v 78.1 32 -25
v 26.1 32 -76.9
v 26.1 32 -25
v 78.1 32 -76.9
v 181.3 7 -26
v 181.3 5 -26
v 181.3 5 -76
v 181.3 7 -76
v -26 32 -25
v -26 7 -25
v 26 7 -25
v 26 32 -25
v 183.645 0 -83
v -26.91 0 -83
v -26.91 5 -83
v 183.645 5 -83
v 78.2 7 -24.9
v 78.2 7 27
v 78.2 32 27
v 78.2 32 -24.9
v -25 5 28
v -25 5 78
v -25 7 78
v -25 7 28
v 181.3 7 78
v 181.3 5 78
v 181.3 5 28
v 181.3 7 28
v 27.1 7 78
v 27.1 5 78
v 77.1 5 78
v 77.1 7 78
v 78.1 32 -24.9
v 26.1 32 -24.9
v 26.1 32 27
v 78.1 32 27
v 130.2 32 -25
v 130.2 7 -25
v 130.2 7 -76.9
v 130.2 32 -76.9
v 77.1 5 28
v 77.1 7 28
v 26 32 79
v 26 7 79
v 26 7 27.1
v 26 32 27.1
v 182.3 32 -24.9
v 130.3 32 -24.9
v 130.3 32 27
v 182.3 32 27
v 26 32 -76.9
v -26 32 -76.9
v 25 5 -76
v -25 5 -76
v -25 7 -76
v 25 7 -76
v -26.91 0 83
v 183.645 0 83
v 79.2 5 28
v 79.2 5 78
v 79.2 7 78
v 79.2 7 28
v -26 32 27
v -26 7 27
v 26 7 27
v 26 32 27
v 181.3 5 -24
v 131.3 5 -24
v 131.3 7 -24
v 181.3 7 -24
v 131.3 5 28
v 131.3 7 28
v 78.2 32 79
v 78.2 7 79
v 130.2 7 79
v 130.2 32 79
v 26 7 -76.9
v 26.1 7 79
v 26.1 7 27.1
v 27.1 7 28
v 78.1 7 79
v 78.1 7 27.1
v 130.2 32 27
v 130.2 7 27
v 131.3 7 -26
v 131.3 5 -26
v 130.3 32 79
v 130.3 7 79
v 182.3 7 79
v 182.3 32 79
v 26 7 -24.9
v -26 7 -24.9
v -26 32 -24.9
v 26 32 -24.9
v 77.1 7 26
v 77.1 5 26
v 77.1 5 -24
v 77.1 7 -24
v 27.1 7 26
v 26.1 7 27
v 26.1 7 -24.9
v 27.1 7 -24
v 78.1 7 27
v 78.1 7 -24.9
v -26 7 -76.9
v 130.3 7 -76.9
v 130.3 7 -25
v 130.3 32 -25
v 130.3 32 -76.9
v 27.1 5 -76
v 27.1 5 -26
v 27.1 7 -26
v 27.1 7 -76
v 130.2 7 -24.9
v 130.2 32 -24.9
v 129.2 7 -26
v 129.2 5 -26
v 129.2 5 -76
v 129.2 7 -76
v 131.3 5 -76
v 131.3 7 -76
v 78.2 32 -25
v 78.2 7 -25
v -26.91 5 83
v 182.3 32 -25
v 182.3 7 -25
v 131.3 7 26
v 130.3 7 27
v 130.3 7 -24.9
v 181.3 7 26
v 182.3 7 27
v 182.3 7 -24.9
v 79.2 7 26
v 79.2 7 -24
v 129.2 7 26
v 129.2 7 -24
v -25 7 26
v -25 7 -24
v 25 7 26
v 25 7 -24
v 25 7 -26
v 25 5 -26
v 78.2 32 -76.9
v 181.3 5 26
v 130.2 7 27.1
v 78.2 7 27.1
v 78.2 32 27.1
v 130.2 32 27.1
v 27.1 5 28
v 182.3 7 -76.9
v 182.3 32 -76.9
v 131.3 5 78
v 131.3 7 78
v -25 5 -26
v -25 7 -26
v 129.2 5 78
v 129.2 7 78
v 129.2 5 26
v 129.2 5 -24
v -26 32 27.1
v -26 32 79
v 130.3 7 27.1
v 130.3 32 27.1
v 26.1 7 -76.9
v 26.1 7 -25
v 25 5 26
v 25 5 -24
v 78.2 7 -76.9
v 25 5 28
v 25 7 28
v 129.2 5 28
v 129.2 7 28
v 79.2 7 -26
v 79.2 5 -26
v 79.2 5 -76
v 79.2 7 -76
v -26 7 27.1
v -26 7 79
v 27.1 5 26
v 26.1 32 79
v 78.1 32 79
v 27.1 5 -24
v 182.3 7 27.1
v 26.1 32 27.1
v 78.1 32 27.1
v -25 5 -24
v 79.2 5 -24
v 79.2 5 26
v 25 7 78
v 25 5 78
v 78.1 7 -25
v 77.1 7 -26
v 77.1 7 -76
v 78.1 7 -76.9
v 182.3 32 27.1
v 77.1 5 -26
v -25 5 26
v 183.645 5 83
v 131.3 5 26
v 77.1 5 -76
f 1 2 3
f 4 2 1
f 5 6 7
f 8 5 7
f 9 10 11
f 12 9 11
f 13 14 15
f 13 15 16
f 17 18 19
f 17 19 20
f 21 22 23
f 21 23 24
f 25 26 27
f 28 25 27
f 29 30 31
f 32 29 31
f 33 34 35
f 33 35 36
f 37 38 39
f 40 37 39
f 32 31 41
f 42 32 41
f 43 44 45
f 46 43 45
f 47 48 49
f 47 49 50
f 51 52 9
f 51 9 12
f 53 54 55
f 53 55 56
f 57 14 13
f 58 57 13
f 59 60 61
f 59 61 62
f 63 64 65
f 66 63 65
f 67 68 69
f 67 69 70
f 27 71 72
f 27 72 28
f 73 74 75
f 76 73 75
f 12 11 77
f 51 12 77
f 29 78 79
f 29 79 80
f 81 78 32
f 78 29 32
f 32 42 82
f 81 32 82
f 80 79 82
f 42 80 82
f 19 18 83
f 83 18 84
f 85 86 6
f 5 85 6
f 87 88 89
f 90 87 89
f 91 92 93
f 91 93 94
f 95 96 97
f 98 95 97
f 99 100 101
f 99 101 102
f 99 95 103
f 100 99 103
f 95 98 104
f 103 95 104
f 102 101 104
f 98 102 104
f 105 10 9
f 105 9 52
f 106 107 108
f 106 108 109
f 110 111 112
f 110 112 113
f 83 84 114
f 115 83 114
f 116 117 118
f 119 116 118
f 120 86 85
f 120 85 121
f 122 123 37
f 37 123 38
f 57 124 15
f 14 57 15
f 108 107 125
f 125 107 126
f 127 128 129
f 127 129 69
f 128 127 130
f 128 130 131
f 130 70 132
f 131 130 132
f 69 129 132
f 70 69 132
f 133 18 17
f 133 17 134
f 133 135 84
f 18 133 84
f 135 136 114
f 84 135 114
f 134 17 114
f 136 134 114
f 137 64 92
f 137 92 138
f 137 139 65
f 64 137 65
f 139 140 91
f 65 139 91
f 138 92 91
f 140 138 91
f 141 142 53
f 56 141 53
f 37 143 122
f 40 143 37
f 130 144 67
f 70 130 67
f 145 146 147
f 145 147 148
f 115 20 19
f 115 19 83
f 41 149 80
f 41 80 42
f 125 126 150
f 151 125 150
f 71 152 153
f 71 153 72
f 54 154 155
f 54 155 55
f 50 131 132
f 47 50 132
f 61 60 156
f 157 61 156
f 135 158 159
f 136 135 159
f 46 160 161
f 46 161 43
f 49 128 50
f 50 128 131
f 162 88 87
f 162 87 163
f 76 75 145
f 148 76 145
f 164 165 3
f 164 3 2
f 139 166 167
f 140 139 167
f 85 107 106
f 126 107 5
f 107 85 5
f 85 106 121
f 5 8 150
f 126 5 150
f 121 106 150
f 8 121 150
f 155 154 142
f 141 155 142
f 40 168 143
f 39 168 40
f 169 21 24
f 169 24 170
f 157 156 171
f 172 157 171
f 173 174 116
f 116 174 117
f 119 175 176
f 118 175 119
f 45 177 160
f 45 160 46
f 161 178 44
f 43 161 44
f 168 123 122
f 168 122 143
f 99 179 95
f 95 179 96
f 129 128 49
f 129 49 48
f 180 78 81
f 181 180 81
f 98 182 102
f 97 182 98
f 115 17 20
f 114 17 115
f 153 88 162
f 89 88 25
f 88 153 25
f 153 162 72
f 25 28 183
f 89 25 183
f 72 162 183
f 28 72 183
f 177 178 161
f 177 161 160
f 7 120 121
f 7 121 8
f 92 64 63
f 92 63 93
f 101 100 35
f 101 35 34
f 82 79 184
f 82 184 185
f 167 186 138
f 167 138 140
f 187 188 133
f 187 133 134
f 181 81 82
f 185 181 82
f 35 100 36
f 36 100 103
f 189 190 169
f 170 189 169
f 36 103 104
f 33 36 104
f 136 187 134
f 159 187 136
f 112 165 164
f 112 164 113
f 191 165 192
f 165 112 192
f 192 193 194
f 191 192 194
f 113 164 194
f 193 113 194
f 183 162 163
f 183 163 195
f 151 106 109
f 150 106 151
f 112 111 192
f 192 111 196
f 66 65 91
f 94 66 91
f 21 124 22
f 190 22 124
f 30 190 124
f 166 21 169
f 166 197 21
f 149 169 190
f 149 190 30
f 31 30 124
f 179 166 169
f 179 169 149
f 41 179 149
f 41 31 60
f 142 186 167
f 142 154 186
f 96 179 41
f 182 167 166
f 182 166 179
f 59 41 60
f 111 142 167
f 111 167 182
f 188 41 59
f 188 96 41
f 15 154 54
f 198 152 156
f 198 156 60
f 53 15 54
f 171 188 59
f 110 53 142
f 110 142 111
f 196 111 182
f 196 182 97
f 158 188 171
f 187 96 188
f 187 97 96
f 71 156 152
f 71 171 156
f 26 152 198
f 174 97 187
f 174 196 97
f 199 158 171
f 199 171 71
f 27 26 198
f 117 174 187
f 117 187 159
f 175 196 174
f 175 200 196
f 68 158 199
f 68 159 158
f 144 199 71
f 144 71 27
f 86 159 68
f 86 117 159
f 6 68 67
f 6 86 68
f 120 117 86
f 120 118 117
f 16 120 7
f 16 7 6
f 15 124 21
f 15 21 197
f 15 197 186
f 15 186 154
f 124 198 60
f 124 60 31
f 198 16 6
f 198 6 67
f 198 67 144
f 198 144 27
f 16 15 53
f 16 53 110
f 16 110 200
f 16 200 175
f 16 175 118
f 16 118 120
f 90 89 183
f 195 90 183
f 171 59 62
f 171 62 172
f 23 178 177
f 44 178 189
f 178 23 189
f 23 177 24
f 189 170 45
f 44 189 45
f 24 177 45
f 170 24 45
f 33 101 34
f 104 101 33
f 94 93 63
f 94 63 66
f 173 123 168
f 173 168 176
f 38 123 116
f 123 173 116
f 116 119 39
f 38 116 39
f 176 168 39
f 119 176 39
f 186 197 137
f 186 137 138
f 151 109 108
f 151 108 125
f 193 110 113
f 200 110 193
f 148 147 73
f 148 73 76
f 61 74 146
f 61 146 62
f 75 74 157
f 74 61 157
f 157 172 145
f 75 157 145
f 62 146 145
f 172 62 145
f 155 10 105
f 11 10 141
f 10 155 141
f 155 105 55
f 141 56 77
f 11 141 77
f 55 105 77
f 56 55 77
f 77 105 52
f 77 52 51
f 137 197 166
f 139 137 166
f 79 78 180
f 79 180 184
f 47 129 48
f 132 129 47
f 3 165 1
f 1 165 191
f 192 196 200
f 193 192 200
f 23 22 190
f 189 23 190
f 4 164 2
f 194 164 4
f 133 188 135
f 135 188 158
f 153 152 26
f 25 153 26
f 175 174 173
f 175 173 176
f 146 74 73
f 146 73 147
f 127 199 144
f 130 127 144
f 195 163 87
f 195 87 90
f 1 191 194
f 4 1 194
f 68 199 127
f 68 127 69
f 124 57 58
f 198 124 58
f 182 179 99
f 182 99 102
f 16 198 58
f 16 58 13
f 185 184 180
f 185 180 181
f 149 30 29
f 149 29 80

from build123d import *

# Parameters (mm, degrees)
SKETCH1_W                  = 500
SKETCH1_H                  = 166
BOSS_EXTRUDE1_DEPTH        = 5
SKETCH2_W                  = 50
SKETCH2_H                  = 50
BOSS_EXTRUDE3_DEPTH        = 2
LPATTERN1_COUNT            = 3
LPATTERN1_PITCH            = 52
SKETCH3_W                  = 52
SKETCH3_H                  = 51.9
BOSS_EXTRUDE8_DEPTH        = 25
LPATTERN5_COUNT            = 3
LPATTERN5_PITCH            = 52
LPATTERN6_COUNT            = 4
LPATTERN6_PITCH            = 52.1
LPATTERN6_COPY_1_SKETCH_W  = 50
LPATTERN6_COPY_1_SKETCH_H  = 50
LPATTERN6_COPY_1_DEPTH     = 2
LPATTERN6_COPY_2_SKETCH_W  = 50
LPATTERN6_COPY_2_SKETCH_H  = 50
LPATTERN6_COPY_2_DEPTH     = 2
LPATTERN6_COPY_3_SKETCH_W  = 50
LPATTERN6_COPY_3_SKETCH_H  = 50
LPATTERN6_COPY_3_DEPTH     = 2
LPATTERN6_COPY_4_SKETCH_W  = 50
LPATTERN6_COPY_4_SKETCH_H  = 50
LPATTERN6_COPY_4_DEPTH     = 2
LPATTERN6_COPY_5_SKETCH_W  = 50
LPATTERN6_COPY_5_SKETCH_H  = 50
LPATTERN6_COPY_5_DEPTH     = 2
LPATTERN6_COPY_6_SKETCH_W  = 50
LPATTERN6_COPY_6_SKETCH_H  = 50
LPATTERN6_COPY_6_DEPTH     = 2
LPATTERN6_COPY_7_SKETCH_W  = 52
LPATTERN6_COPY_7_SKETCH_H  = 51.9
LPATTERN6_COPY_7_DEPTH     = 25
LPATTERN6_COPY_8_SKETCH_W  = 52
LPATTERN6_COPY_8_SKETCH_H  = 51.9
LPATTERN6_COPY_8_DEPTH     = 25
LPATTERN6_COPY_9_SKETCH_W  = 52
LPATTERN6_COPY_9_SKETCH_H  = 51.9
LPATTERN6_COPY_9_DEPTH     = 25
LPATTERN6_COPY_10_SKETCH_W = 52
LPATTERN6_COPY_10_SKETCH_H = 51.9
LPATTERN6_COPY_10_DEPTH    = 25
LPATTERN6_COPY_11_SKETCH_W = 52
LPATTERN6_COPY_11_SKETCH_H = 51.9
LPATTERN6_COPY_11_DEPTH    = 25
LPATTERN6_COPY_12_SKETCH_W = 52
LPATTERN6_COPY_12_SKETCH_H = 51.9
LPATTERN6_COPY_12_DEPTH    = 25
SKETCH4_W                  = 223.089941366
SKETCH4_H                  = 166
SKETCH4_W_2                = 66.355147464
CUT_EXTRUDE1_DEPTH         = 10


with BuildPart() as part:
    # Sketch1 → Boss-Extrude1 (new body)
    with BuildSketch(Plane(origin=(0, 0, 0), x_dir=(1, 0, 0), z_dir=(0, 1, 0))):
        Rectangle(SKETCH1_W, SKETCH1_H)
    extrude(amount=BOSS_EXTRUDE1_DEPTH)

    # Sketch2 → Boss-Extrude3 (add)
    with BuildSketch(Plane(origin=(0, 5, 0), x_dir=(1, 0, 0), z_dir=(0, 1, 0))):
        with Locations((0, -53)):
            Rectangle(SKETCH2_W, SKETCH2_H)
    boss_extrude3 = extrude(amount=BOSS_EXTRUDE3_DEPTH)

    # LPattern1: Boss-Extrude3 ×3
    with Locations(*[(0, 0, -i * LPATTERN1_PITCH) for i in range(1, LPATTERN1_COUNT)]):
        add(boss_extrude3)

    # Sketch3 → Boss-Extrude8 (add)
    with BuildSketch(Plane(origin=(0, 7, 0), x_dir=(1, 0, 0), z_dir=(0, 1, 0))):
        with Locations((0, -53.05)):
            Rectangle(SKETCH3_W, SKETCH3_H)
    boss_extrude8 = extrude(amount=BOSS_EXTRUDE8_DEPTH)

    # LPattern5: Boss-Extrude8 ×3
    with Locations(*[(0, 0, -i * LPATTERN5_PITCH) for i in range(1, LPATTERN5_COUNT)]):
        add(boss_extrude8)

    # LPattern6: Boss-Extrude3, Boss-Extrude8 ×4
    with Locations(*[(i * LPATTERN6_PITCH, 0, 0) for i in range(1, LPATTERN6_COUNT)]):
        add(boss_extrude3)
        add(boss_extrude8)

    # LPattern6 copy 1 sketch → LPattern6 copy 1 (add)
    with BuildSketch(Plane(origin=(52.1, 5, -52), x_dir=(1, 0, 0), z_dir=(0, 1, 0))):
        with Locations((0, -53)):
            Rectangle(LPATTERN6_COPY_1_SKETCH_W, LPATTERN6_COPY_1_SKETCH_H)
    extrude(amount=LPATTERN6_COPY_1_DEPTH)

    # LPattern6 copy 2 sketch → LPattern6 copy 2 (add)
    with BuildSketch(Plane(origin=(104.2, 5, -52), x_dir=(1, 0, 0), z_dir=(0, 1, 0))):
        with Locations((0, -53)):
            Rectangle(LPATTERN6_COPY_2_SKETCH_W, LPATTERN6_COPY_2_SKETCH_H)
    extrude(amount=LPATTERN6_COPY_2_DEPTH)

    # LPattern6 copy 3 sketch → LPattern6 copy 3 (add)
    with BuildSketch(Plane(origin=(156.3, 5, -52), x_dir=(1, 0, 0), z_dir=(0, 1, 0))):
        with Locations((0, -53)):
            Rectangle(LPATTERN6_COPY_3_SKETCH_W, LPATTERN6_COPY_3_SKETCH_H)
    extrude(amount=LPATTERN6_COPY_3_DEPTH)

    # LPattern6 copy 4 sketch → LPattern6 copy 4 (add)
    with BuildSketch(Plane(origin=(52.1, 5, -104), x_dir=(1, 0, 0), z_dir=(0, 1, 0))):
        with Locations((0, -53)):
            Rectangle(LPATTERN6_COPY_4_SKETCH_W, LPATTERN6_COPY_4_SKETCH_H)
    extrude(amount=LPATTERN6_COPY_4_DEPTH)

    # LPattern6 copy 5 sketch → LPattern6 copy 5 (add)
    with BuildSketch(Plane(origin=(104.2, 5, -104), x_dir=(1, 0, 0), z_dir=(0, 1, 0))):
        with Locations((0, -53)):
            Rectangle(LPATTERN6_COPY_5_SKETCH_W, LPATTERN6_COPY_5_SKETCH_H)
    extrude(amount=LPATTERN6_COPY_5_DEPTH)

    # LPattern6 copy 6 sketch → LPattern6 copy 6 (add)
    with BuildSketch(Plane(origin=(156.3, 5, -104), x_dir=(1, 0, 0), z_dir=(0, 1, 0))):
        with Locations((0, -53)):
            Rectangle(LPATTERN6_COPY_6_SKETCH_W, LPATTERN6_COPY_6_SKETCH_H)
    extrude(amount=LPATTERN6_COPY_6_DEPTH)

    # LPattern6 copy 7 sketch → LPattern6 copy 7 (add)
    with BuildSketch(Plane(origin=(52.1, 7, -52), x_dir=(1, 0, 0), z_dir=(0, 1, 0))):
        with Locations((0, -53.05)):
            Rectangle(LPATTERN6_COPY_7_SKETCH_W, LPATTERN6_COPY_7_SKETCH_H)
    extrude(amount=LPATTERN6_COPY_7_DEPTH)

    # LPattern6 copy 8 sketch → LPattern6 copy 8 (add)
    with BuildSketch(Plane(origin=(104.2, 7, -52), x_dir=(1, 0, 0), z_dir=(0, 1, 0))):
        with Locations((0, -53.05)):
            Rectangle(LPATTERN6_COPY_8_SKETCH_W, LPATTERN6_COPY_8_SKETCH_H)
    extrude(amount=LPATTERN6_COPY_8_DEPTH)

    # LPattern6 copy 9 sketch → LPattern6 copy 9 (add)
    with BuildSketch(Plane(origin=(156.3, 7, -52), x_dir=(1, 0, 0), z_dir=(0, 1, 0))):
        with Locations((0, -53.05)):
            Rectangle(LPATTERN6_COPY_9_SKETCH_W, LPATTERN6_COPY_9_SKETCH_H)
    extrude(amount=LPATTERN6_COPY_9_DEPTH)

    # LPattern6 copy 10 sketch → LPattern6 copy 10 (add)
    with BuildSketch(Plane(origin=(52.1, 7, -104), x_dir=(1, 0, 0), z_dir=(0, 1, 0))):
        with Locations((0, -53.05)):
            Rectangle(LPATTERN6_COPY_10_SKETCH_W, LPATTERN6_COPY_10_SKETCH_H)
    extrude(amount=LPATTERN6_COPY_10_DEPTH)

    # LPattern6 copy 11 sketch → LPattern6 copy 11 (add)
    with BuildSketch(Plane(origin=(104.2, 7, -104), x_dir=(1, 0, 0), z_dir=(0, 1, 0))):
        with Locations((0, -53.05)):
            Rectangle(LPATTERN6_COPY_11_SKETCH_W, LPATTERN6_COPY_11_SKETCH_H)
    extrude(amount=LPATTERN6_COPY_11_DEPTH)

    # LPattern6 copy 12 sketch → LPattern6 copy 12 (add)
    with BuildSketch(Plane(origin=(156.3, 7, -104), x_dir=(1, 0, 0), z_dir=(0, 1, 0))):
        with Locations((0, -53.05)):
            Rectangle(LPATTERN6_COPY_12_SKETCH_W, LPATTERN6_COPY_12_SKETCH_H)
    extrude(amount=LPATTERN6_COPY_12_DEPTH)

    # Sketch4 → Cut-Extrude1 (cut)
    with BuildSketch(Plane(origin=(0, 5, 0), x_dir=(1, 0, 0), z_dir=(0, 1, 0))):
        with Locations((-138.455029317, 0)):
            Rectangle(SKETCH4_W, SKETCH4_H)
        with Locations((216.822426268, 0)):
            Rectangle(SKETCH4_W_2, SKETCH4_H)
    extrude(amount=-CUT_EXTRUDE1_DEPTH, mode=Mode.SUBTRACT)


solid = part.part
